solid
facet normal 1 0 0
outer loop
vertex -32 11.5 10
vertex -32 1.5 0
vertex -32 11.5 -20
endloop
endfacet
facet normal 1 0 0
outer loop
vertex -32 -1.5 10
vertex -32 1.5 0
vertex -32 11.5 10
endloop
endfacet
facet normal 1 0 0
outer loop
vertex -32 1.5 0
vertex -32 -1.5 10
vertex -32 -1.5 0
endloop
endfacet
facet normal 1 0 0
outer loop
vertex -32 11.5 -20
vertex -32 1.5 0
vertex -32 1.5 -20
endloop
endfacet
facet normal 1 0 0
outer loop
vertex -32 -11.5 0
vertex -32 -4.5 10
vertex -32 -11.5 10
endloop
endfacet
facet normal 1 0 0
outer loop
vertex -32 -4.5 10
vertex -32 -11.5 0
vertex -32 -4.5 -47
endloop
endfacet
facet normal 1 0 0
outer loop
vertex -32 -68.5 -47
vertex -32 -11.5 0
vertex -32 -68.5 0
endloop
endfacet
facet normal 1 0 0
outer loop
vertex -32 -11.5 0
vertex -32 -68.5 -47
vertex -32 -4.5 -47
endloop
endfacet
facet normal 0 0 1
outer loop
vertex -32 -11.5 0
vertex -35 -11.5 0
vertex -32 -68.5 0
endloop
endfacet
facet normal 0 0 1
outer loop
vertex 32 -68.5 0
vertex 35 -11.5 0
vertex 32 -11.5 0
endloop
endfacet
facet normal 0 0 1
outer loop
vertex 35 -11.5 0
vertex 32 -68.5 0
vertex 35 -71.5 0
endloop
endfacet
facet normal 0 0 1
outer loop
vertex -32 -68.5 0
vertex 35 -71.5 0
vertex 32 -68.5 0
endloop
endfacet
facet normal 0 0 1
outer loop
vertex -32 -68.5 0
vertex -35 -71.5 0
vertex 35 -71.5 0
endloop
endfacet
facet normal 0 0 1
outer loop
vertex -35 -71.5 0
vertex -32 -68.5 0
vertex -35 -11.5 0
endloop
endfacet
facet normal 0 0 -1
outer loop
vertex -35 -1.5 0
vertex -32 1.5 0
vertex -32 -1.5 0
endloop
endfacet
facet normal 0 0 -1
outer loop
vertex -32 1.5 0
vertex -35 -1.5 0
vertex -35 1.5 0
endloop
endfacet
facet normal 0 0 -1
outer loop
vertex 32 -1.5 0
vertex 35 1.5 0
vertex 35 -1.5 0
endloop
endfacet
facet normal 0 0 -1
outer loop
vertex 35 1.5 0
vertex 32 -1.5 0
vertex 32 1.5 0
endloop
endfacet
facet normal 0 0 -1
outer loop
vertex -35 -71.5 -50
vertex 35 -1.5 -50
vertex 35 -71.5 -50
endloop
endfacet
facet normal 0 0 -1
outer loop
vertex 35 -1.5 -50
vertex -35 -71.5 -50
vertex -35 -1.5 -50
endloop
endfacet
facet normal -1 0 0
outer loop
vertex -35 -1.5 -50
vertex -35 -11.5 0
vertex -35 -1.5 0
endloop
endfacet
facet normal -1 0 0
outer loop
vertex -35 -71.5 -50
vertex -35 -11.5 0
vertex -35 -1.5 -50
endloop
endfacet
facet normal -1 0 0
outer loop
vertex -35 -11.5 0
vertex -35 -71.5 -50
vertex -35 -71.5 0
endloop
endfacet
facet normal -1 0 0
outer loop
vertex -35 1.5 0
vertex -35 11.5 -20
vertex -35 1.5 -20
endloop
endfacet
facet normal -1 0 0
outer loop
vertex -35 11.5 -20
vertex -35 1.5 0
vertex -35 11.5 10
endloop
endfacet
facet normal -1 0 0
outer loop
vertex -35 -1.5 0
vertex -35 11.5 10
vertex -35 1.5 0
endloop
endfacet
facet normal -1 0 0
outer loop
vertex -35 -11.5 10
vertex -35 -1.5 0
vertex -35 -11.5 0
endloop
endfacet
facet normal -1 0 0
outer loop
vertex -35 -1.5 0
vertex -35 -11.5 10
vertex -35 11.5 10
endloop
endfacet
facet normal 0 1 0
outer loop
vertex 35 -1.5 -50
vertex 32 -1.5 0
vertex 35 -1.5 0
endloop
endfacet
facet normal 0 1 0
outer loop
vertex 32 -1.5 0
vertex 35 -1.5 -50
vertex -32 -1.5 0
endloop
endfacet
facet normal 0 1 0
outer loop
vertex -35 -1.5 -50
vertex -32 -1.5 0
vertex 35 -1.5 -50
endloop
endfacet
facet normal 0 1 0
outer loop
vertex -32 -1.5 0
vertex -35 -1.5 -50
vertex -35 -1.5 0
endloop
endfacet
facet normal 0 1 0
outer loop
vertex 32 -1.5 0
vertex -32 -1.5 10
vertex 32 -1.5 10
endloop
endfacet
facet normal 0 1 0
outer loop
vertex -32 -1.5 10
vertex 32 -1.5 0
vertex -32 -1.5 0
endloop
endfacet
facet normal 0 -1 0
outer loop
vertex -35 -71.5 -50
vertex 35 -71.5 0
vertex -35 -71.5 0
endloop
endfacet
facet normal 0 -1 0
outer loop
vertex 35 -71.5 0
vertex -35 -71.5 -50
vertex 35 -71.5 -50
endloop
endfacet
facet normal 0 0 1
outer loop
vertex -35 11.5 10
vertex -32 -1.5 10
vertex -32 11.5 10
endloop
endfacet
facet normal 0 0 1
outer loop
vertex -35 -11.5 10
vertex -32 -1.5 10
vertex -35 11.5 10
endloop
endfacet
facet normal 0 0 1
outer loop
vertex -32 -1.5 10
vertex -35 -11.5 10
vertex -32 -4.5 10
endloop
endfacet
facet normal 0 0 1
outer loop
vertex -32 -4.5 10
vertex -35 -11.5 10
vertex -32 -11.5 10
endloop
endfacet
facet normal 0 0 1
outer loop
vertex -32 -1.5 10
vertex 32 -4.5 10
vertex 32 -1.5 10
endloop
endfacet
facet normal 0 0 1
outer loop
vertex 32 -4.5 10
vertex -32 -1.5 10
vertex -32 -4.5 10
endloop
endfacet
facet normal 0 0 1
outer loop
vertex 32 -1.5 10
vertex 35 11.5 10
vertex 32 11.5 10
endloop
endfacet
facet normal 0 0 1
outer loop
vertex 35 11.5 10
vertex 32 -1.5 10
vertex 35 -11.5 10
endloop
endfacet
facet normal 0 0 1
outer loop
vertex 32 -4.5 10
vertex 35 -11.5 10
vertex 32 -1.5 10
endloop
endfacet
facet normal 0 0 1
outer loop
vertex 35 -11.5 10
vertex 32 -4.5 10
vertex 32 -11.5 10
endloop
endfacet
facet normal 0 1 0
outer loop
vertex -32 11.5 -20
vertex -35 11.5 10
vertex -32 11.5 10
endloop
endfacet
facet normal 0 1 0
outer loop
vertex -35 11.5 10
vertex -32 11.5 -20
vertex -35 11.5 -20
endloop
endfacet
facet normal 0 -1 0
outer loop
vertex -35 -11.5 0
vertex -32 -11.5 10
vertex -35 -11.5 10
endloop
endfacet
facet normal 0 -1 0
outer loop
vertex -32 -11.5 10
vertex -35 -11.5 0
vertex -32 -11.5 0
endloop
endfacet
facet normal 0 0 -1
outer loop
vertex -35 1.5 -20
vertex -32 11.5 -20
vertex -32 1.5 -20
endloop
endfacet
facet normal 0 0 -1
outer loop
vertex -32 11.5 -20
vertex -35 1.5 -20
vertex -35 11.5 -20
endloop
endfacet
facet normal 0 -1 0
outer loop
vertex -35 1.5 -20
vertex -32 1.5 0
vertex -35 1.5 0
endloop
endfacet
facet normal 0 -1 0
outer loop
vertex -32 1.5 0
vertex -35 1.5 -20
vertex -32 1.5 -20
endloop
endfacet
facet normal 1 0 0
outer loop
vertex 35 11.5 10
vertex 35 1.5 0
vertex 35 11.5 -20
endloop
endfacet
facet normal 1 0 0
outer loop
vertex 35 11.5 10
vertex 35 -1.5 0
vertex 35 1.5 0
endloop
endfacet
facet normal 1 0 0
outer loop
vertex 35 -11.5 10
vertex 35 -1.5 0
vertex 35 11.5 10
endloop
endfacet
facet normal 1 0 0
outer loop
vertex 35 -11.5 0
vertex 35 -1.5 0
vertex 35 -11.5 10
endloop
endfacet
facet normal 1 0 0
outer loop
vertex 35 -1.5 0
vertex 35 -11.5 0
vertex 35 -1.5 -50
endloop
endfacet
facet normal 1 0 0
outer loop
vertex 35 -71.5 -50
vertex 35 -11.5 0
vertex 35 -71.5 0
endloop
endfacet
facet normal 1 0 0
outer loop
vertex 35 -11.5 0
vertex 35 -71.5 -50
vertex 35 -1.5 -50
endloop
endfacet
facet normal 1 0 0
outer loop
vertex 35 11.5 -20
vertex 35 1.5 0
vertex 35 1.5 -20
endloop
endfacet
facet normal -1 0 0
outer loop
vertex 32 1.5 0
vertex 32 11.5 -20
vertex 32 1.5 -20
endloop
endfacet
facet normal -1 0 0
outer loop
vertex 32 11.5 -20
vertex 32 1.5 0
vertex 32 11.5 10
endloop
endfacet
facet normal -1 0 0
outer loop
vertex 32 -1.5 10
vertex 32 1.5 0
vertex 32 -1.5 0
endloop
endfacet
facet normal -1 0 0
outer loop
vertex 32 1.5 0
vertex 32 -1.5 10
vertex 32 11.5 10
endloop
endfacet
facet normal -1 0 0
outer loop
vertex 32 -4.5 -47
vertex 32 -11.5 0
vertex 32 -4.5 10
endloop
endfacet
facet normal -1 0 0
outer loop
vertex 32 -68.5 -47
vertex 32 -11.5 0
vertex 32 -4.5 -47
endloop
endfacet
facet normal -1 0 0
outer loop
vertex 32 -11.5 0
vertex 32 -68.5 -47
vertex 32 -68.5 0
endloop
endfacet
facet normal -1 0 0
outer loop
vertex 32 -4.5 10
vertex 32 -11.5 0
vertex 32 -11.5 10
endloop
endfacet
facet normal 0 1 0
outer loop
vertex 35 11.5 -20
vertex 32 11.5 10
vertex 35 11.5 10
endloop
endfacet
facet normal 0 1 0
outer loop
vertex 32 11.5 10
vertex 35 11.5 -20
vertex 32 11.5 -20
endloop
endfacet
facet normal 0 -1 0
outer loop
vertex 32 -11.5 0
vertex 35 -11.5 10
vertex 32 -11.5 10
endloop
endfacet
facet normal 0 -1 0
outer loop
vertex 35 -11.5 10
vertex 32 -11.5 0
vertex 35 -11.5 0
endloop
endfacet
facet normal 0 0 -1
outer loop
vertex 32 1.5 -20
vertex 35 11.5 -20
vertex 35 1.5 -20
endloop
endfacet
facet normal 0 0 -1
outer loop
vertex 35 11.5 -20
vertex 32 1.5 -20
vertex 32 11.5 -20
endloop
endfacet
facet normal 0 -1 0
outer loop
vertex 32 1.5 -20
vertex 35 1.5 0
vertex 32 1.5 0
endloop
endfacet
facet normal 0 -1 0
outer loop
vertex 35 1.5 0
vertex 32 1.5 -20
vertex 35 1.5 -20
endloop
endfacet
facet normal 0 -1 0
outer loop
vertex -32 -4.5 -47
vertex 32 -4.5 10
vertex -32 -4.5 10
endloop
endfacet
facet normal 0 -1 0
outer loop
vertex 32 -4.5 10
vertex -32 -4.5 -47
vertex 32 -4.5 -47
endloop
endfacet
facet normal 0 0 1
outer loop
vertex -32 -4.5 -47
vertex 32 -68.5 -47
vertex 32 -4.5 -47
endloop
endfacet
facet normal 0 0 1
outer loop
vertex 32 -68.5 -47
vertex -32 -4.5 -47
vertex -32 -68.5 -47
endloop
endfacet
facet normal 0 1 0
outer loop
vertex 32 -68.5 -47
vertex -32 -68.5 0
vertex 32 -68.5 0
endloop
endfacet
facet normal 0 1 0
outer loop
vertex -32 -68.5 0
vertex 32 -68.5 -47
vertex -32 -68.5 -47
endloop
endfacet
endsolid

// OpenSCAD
// file: bottom.scad
include <../config.scad>;
include <config.scad>;

module pot_bottom()
{
    bottom_y = pot_y - 2*material_z;

    translate([
        0,
        -bottom_y/2,
        0
        ])
    cube([
        pot_x - 2*material_z,
        bottom_y,
        material_z
        ], center=true);
}

pot_bottom();
// file: side.scad
include <../config.scad>;
include <config.scad>;

module pot_side(x)
{
    // side wall
    translate([
        x,
        -pot_y/2 - material_z/2,
        -pot_z/2
        ])
    cube([
        material_z,
        pot_y,
        pot_z
        ], center=true);

    // upper hook part
    translate([
        x,
        0,
        hook_width/2
        ])
    cube([
        material_z,
        hook_width*2 + material_z,
        hook_width
        ], center=true);

    // hook
    translate([
        x,
        hook_width/2 + material_z/2,
        -support_z/2
        ])
    cube([
        material_z,
        hook_width,
        support_z
        ], center=true);
}

pot_side(0);
// file: front+back.scad
include <../config.scad>;
include <config.scad>;

module pot_front()
{
    // upper edge of wall is at z=0
    translate([
        0,
        0,
        -pot_z/2
        ])
    cube([
        pot_x - 2*material_z,
        material_z,
        pot_z
        ], center=true);
}

module pot_back()
{
    pot_front();

    translate([
        0,
        0,
        hook_width/2
        ])
    cube([
        pot_x - 2*material_z,
        material_z,
        hook_width
        ], center=true);
}

pot_front();
// file: config.scad
include <../config.scad>;

// settings specific to this pot type

inset_front = material_z/2;
inset_back = material_z/2;
inset_bottom = material_z;

hole_radius = 1.5;

hook_round_top_z = 3;
hook_round_bottom_z = 3;
// file: ../config.scad
// all measures in millimeters

// rendering quality
$fn = 200;
nothing = 0.05;

// material to cut from
material_z = 3;

// wall configuration: bounding box measures
wall_x = 550;
wall_y = 30;
wall_z = 400;

foot_y_back = 130;
foot_y_front = 200;

// foot height
foot_z = 25;

// rounded corners at front and back of the foot
foot_round_y = 20;

// number of support beams
support_count = 5;

// height of a support beam
support_z = 20;

// pot configuration: outer measures of the top opening
pot_x = 70;
pot_y = 70;
pot_z = 50;

// pots have hooks to hang at the wall supports
hook_width = 10;
// main file
include <../config.scad>;
include <config.scad>;
use <front+back.scad>;
use <side.scad>;
use <bottom.scad>;

module pot2()
{
    color("brown")
    translate([
        0,
        -material_z * 3/2,
        - pot_z + material_z/2
        ])
    pot_bottom();

    color("darkgreen")
    for (x = [
            -pot_x/2 + material_z/2,
            +pot_x/2 - material_z/2
            ])
    {
        pot_side(x);
    }

    color("darkblue")
    translate([
        0,
        - pot_y,
        0
        ])
    pot_front();

    color("darkcyan")
    translate([
        0,
        - material_z,
        0
        ])
    pot_back();
}

pot2();
